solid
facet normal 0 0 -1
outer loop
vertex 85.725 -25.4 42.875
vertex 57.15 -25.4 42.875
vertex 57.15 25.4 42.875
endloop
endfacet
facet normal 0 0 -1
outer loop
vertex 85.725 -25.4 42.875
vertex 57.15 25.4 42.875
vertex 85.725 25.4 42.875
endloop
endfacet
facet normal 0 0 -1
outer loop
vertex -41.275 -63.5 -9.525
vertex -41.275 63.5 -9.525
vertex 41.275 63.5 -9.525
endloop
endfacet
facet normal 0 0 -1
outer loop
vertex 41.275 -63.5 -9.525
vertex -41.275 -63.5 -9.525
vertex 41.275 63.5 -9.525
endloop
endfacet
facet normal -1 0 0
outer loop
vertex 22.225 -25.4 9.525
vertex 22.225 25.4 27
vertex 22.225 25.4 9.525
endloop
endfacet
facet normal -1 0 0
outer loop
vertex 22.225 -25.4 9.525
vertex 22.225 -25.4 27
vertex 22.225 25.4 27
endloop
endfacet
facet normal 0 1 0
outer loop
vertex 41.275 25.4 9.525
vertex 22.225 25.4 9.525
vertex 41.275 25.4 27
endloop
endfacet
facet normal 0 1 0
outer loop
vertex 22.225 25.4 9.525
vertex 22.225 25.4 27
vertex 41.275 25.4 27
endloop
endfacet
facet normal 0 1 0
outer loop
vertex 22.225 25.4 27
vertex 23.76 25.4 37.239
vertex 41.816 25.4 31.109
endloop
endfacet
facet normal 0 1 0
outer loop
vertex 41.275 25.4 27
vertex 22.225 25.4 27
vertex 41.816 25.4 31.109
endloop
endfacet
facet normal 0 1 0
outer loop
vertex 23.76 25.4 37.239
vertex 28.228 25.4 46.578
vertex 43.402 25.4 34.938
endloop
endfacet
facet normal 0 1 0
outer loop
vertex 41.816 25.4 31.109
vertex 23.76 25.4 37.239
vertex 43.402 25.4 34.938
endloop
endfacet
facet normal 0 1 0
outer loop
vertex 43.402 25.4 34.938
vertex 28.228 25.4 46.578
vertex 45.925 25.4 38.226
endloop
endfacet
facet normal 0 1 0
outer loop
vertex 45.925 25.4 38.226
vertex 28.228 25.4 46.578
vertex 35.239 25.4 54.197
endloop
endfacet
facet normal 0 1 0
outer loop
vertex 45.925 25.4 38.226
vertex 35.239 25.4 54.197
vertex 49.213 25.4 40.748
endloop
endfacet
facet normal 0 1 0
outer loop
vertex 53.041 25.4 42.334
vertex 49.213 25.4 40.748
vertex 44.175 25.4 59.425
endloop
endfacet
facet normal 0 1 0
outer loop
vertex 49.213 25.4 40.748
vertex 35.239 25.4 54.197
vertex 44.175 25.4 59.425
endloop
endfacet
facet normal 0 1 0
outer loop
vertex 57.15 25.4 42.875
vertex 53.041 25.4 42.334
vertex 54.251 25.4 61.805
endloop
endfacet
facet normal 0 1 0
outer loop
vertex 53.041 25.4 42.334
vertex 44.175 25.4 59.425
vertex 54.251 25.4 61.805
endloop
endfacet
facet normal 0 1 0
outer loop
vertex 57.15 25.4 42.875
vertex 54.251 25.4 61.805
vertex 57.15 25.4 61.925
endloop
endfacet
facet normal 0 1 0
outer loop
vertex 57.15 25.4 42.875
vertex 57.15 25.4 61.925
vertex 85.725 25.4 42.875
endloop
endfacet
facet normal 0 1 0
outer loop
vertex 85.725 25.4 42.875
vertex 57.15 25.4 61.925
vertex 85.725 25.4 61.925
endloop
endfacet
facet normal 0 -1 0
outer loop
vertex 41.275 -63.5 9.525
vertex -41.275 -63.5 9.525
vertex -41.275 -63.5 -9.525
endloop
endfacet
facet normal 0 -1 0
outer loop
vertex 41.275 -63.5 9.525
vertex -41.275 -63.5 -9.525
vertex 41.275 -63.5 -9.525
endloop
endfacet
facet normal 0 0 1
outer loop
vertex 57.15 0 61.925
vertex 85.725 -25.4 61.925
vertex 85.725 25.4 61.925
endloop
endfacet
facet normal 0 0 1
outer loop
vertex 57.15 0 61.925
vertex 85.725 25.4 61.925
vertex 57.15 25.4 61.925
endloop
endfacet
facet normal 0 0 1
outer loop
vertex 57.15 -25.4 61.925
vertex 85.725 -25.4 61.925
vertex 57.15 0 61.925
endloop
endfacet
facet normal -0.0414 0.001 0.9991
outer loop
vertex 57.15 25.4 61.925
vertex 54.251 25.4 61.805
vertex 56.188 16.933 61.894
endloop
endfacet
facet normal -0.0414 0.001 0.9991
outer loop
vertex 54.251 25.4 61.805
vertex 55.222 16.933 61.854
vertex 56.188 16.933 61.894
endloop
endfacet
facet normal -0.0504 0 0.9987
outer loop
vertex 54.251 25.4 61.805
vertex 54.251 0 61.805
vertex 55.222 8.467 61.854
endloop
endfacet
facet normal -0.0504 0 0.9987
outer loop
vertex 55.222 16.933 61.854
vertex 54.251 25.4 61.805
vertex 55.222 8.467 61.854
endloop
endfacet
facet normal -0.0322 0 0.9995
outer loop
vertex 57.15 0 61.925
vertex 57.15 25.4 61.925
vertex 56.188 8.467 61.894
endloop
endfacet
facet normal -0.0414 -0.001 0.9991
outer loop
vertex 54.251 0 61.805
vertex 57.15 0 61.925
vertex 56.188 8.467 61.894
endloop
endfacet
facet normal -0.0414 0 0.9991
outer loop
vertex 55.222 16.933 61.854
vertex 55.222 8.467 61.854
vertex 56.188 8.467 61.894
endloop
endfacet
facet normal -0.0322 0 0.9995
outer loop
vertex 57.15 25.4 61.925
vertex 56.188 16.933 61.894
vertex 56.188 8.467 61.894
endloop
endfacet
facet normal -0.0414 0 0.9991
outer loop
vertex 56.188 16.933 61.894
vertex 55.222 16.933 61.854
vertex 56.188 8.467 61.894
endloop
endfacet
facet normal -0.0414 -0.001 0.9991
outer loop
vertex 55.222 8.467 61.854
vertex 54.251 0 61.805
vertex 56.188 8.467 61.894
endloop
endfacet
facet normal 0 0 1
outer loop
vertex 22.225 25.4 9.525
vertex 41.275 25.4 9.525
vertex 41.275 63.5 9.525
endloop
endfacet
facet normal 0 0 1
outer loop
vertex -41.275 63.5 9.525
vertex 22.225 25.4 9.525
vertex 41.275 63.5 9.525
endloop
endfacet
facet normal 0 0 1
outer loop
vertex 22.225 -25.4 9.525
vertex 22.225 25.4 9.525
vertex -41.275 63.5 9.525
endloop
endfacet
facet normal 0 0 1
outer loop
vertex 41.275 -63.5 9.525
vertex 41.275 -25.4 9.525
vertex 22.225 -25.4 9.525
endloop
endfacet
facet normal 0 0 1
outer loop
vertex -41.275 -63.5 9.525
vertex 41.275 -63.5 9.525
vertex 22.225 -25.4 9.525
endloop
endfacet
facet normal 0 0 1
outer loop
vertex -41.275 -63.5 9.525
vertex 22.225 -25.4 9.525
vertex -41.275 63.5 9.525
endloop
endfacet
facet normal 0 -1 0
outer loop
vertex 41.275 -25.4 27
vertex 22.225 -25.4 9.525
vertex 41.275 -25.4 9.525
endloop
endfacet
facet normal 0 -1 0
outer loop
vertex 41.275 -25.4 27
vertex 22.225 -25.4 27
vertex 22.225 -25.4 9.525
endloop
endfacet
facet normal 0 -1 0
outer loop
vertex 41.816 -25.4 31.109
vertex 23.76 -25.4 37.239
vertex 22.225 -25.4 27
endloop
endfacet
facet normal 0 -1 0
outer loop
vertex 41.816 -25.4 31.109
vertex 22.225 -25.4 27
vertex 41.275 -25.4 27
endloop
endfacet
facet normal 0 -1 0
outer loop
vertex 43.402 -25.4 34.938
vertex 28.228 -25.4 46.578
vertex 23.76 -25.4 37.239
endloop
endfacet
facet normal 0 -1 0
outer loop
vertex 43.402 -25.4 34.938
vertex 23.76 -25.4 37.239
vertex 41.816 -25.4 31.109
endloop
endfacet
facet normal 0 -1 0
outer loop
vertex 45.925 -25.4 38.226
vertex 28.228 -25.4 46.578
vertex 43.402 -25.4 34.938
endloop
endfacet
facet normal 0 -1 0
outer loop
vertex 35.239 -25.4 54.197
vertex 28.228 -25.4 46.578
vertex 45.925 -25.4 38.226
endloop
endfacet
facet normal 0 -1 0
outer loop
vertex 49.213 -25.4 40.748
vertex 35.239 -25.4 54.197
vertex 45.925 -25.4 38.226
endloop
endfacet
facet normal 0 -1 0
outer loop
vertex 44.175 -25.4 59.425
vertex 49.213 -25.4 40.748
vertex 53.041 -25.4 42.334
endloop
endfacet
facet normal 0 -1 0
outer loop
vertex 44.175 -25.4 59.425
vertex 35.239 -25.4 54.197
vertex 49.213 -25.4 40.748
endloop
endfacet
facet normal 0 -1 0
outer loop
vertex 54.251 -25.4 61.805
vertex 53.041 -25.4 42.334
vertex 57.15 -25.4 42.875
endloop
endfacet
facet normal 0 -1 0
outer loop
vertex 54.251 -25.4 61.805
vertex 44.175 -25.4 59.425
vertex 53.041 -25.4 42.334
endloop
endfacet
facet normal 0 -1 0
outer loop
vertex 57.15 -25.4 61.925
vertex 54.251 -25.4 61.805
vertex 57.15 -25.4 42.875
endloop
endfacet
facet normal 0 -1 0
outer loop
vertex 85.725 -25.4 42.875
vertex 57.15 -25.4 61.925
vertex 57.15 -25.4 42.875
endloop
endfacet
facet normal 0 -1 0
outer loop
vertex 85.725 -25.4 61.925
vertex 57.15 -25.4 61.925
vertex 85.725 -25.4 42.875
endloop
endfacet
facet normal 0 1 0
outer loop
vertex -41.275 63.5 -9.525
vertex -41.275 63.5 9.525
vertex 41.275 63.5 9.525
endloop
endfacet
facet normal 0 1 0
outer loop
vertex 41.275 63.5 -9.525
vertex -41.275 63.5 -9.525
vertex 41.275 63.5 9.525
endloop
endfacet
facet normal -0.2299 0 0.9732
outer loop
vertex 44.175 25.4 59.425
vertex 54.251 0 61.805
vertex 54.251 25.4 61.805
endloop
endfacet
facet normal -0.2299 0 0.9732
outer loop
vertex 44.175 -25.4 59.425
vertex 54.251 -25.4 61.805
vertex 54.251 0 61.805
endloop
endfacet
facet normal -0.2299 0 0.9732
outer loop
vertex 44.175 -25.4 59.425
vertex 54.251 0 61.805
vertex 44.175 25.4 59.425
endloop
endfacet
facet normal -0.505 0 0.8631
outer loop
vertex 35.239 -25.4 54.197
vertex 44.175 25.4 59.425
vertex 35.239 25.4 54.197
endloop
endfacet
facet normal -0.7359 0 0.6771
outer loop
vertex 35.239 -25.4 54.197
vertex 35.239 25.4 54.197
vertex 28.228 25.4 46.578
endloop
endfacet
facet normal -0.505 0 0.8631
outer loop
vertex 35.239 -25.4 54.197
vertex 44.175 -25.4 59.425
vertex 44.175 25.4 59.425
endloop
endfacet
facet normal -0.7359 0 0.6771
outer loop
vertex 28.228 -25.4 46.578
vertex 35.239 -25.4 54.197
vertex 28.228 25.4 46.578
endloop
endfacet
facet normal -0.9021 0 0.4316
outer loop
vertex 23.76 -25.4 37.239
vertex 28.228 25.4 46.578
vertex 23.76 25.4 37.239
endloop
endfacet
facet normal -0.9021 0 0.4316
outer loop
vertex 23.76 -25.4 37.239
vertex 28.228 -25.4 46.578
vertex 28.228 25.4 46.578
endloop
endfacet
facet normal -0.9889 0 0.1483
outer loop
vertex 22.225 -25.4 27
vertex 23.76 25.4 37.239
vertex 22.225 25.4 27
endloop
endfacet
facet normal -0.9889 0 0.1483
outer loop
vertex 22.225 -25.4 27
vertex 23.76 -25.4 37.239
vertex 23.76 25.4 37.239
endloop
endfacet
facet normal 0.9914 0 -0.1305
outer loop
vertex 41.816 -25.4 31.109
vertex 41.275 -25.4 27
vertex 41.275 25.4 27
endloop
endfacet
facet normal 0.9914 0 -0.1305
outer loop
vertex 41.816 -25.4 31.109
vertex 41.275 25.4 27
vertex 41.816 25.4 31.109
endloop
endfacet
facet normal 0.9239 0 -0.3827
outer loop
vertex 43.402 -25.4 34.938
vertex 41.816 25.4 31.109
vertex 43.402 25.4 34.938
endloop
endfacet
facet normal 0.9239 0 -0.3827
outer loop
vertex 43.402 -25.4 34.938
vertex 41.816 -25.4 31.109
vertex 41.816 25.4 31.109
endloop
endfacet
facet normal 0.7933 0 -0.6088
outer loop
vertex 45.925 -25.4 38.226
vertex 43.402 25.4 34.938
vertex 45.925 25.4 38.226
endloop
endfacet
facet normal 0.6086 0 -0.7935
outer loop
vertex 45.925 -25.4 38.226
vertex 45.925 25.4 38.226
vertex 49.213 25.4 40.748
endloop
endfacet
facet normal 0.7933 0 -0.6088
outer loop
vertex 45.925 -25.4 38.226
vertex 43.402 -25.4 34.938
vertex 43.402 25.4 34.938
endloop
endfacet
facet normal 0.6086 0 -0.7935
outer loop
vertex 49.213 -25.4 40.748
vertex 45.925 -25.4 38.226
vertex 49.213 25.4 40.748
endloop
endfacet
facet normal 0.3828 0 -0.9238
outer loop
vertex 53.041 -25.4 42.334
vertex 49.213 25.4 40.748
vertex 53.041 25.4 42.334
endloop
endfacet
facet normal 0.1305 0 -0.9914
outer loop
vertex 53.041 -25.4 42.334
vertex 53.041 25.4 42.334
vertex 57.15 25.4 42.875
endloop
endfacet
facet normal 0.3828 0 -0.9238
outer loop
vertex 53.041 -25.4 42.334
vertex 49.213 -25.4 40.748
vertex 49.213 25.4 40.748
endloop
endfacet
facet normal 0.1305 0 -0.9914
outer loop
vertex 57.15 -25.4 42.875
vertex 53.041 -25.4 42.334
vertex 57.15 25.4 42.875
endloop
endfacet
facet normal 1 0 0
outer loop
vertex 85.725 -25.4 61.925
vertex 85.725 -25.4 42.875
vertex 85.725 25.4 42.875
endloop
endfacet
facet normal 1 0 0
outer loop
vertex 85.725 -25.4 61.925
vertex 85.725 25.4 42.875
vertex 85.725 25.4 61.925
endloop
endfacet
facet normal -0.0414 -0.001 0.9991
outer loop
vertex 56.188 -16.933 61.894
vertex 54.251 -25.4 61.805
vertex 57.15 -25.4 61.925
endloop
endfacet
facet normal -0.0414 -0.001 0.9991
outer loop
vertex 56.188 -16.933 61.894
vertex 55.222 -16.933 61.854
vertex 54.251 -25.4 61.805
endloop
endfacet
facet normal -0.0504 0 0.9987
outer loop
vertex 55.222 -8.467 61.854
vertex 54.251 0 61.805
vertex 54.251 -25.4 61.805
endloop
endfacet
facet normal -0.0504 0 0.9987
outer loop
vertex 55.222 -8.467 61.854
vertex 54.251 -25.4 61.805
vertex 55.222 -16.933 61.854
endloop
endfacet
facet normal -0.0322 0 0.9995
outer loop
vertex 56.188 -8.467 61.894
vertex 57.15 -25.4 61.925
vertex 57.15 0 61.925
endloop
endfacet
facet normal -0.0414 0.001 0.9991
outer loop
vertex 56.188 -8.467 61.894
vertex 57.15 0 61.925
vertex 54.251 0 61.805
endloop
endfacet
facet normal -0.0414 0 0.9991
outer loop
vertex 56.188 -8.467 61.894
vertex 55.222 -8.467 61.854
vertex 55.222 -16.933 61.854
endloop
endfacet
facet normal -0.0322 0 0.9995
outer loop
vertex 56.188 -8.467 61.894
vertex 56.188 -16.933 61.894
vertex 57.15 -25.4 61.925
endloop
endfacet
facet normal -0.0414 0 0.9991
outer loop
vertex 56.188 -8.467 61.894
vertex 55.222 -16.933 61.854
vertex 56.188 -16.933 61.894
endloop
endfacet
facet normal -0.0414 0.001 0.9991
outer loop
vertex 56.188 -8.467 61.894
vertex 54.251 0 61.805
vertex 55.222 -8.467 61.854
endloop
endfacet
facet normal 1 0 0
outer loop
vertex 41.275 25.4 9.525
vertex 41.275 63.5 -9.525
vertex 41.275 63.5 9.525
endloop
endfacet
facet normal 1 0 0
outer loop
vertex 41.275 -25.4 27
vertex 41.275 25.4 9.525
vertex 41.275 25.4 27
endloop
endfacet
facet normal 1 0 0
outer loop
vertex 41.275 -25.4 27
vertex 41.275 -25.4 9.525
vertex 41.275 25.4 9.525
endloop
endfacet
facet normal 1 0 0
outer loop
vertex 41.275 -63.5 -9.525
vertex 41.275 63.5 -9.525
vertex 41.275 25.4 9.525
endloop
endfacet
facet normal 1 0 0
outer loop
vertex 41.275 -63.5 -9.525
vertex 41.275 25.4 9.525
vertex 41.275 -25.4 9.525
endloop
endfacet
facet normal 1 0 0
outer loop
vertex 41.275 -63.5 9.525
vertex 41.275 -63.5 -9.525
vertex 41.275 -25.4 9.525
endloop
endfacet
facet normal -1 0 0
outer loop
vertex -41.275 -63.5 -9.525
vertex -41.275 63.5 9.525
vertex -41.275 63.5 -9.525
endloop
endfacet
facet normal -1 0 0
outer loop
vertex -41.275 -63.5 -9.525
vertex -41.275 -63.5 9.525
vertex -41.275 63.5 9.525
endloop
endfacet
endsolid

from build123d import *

# Parameters (mm, degrees)
F1_DEPTH = 63.5
F0_W     = 25.4
F0_H     = 19.05
F2_DEPTH = 25.4


with BuildPart() as f1:
    # F0 (on Front) → F1 (new body, symmetric)
    with BuildSketch(Plane.XZ):
        Polygon((-41.275, 9.525), (-41.275, -9.525), (41.275, -9.525), (41.275, 9.525), (22.225, 9.525), align=None)
    extrude(amount=F1_DEPTH, both=True)

    # F0 (on Front) → F2 (join, symmetric)
    with BuildSketch(Plane.XZ):
        with BuildLine():
            Line((22.225, 9.525), (41.275, 9.525))
            Line((41.275, 9.525), (41.275, 27.0002))
            ThreePointArc((41.275, 27.0002), (45.9246798487, 38.2255201513), (57.15, 42.8752))
            Line((57.15, 42.8752), (60.325, 42.8752))
            Line((60.325, 42.8752), (60.325, 61.9252))
            Line((60.325, 61.9252), (57.15, 61.9252))
            add(Edge.make_bspline(
                [(54.2509610844, 61.8046709537), (55.223787741, 61.8579046619), (56.1904041121, 61.8981915291), (57.15, 61.9252)],
                knots=[108.9688631061, 108.9688631061, 108.9688631061, 108.9688631061, 111.5045361635, 111.5045361635, 111.5045361635, 111.5045361635], degree=3))
            ThreePointArc((54.2509610844, 61.8046709537), (31.4497610991, 50.6487379133), (22.225, 27.0002))
            Line((22.225, 27.0002), (22.225, 9.525))
        make_face()
        with Locations((73.025, 52.4002)):
            Rectangle(F0_W, F0_H)
    extrude(amount=F2_DEPTH, both=True)


solid = f1.part
